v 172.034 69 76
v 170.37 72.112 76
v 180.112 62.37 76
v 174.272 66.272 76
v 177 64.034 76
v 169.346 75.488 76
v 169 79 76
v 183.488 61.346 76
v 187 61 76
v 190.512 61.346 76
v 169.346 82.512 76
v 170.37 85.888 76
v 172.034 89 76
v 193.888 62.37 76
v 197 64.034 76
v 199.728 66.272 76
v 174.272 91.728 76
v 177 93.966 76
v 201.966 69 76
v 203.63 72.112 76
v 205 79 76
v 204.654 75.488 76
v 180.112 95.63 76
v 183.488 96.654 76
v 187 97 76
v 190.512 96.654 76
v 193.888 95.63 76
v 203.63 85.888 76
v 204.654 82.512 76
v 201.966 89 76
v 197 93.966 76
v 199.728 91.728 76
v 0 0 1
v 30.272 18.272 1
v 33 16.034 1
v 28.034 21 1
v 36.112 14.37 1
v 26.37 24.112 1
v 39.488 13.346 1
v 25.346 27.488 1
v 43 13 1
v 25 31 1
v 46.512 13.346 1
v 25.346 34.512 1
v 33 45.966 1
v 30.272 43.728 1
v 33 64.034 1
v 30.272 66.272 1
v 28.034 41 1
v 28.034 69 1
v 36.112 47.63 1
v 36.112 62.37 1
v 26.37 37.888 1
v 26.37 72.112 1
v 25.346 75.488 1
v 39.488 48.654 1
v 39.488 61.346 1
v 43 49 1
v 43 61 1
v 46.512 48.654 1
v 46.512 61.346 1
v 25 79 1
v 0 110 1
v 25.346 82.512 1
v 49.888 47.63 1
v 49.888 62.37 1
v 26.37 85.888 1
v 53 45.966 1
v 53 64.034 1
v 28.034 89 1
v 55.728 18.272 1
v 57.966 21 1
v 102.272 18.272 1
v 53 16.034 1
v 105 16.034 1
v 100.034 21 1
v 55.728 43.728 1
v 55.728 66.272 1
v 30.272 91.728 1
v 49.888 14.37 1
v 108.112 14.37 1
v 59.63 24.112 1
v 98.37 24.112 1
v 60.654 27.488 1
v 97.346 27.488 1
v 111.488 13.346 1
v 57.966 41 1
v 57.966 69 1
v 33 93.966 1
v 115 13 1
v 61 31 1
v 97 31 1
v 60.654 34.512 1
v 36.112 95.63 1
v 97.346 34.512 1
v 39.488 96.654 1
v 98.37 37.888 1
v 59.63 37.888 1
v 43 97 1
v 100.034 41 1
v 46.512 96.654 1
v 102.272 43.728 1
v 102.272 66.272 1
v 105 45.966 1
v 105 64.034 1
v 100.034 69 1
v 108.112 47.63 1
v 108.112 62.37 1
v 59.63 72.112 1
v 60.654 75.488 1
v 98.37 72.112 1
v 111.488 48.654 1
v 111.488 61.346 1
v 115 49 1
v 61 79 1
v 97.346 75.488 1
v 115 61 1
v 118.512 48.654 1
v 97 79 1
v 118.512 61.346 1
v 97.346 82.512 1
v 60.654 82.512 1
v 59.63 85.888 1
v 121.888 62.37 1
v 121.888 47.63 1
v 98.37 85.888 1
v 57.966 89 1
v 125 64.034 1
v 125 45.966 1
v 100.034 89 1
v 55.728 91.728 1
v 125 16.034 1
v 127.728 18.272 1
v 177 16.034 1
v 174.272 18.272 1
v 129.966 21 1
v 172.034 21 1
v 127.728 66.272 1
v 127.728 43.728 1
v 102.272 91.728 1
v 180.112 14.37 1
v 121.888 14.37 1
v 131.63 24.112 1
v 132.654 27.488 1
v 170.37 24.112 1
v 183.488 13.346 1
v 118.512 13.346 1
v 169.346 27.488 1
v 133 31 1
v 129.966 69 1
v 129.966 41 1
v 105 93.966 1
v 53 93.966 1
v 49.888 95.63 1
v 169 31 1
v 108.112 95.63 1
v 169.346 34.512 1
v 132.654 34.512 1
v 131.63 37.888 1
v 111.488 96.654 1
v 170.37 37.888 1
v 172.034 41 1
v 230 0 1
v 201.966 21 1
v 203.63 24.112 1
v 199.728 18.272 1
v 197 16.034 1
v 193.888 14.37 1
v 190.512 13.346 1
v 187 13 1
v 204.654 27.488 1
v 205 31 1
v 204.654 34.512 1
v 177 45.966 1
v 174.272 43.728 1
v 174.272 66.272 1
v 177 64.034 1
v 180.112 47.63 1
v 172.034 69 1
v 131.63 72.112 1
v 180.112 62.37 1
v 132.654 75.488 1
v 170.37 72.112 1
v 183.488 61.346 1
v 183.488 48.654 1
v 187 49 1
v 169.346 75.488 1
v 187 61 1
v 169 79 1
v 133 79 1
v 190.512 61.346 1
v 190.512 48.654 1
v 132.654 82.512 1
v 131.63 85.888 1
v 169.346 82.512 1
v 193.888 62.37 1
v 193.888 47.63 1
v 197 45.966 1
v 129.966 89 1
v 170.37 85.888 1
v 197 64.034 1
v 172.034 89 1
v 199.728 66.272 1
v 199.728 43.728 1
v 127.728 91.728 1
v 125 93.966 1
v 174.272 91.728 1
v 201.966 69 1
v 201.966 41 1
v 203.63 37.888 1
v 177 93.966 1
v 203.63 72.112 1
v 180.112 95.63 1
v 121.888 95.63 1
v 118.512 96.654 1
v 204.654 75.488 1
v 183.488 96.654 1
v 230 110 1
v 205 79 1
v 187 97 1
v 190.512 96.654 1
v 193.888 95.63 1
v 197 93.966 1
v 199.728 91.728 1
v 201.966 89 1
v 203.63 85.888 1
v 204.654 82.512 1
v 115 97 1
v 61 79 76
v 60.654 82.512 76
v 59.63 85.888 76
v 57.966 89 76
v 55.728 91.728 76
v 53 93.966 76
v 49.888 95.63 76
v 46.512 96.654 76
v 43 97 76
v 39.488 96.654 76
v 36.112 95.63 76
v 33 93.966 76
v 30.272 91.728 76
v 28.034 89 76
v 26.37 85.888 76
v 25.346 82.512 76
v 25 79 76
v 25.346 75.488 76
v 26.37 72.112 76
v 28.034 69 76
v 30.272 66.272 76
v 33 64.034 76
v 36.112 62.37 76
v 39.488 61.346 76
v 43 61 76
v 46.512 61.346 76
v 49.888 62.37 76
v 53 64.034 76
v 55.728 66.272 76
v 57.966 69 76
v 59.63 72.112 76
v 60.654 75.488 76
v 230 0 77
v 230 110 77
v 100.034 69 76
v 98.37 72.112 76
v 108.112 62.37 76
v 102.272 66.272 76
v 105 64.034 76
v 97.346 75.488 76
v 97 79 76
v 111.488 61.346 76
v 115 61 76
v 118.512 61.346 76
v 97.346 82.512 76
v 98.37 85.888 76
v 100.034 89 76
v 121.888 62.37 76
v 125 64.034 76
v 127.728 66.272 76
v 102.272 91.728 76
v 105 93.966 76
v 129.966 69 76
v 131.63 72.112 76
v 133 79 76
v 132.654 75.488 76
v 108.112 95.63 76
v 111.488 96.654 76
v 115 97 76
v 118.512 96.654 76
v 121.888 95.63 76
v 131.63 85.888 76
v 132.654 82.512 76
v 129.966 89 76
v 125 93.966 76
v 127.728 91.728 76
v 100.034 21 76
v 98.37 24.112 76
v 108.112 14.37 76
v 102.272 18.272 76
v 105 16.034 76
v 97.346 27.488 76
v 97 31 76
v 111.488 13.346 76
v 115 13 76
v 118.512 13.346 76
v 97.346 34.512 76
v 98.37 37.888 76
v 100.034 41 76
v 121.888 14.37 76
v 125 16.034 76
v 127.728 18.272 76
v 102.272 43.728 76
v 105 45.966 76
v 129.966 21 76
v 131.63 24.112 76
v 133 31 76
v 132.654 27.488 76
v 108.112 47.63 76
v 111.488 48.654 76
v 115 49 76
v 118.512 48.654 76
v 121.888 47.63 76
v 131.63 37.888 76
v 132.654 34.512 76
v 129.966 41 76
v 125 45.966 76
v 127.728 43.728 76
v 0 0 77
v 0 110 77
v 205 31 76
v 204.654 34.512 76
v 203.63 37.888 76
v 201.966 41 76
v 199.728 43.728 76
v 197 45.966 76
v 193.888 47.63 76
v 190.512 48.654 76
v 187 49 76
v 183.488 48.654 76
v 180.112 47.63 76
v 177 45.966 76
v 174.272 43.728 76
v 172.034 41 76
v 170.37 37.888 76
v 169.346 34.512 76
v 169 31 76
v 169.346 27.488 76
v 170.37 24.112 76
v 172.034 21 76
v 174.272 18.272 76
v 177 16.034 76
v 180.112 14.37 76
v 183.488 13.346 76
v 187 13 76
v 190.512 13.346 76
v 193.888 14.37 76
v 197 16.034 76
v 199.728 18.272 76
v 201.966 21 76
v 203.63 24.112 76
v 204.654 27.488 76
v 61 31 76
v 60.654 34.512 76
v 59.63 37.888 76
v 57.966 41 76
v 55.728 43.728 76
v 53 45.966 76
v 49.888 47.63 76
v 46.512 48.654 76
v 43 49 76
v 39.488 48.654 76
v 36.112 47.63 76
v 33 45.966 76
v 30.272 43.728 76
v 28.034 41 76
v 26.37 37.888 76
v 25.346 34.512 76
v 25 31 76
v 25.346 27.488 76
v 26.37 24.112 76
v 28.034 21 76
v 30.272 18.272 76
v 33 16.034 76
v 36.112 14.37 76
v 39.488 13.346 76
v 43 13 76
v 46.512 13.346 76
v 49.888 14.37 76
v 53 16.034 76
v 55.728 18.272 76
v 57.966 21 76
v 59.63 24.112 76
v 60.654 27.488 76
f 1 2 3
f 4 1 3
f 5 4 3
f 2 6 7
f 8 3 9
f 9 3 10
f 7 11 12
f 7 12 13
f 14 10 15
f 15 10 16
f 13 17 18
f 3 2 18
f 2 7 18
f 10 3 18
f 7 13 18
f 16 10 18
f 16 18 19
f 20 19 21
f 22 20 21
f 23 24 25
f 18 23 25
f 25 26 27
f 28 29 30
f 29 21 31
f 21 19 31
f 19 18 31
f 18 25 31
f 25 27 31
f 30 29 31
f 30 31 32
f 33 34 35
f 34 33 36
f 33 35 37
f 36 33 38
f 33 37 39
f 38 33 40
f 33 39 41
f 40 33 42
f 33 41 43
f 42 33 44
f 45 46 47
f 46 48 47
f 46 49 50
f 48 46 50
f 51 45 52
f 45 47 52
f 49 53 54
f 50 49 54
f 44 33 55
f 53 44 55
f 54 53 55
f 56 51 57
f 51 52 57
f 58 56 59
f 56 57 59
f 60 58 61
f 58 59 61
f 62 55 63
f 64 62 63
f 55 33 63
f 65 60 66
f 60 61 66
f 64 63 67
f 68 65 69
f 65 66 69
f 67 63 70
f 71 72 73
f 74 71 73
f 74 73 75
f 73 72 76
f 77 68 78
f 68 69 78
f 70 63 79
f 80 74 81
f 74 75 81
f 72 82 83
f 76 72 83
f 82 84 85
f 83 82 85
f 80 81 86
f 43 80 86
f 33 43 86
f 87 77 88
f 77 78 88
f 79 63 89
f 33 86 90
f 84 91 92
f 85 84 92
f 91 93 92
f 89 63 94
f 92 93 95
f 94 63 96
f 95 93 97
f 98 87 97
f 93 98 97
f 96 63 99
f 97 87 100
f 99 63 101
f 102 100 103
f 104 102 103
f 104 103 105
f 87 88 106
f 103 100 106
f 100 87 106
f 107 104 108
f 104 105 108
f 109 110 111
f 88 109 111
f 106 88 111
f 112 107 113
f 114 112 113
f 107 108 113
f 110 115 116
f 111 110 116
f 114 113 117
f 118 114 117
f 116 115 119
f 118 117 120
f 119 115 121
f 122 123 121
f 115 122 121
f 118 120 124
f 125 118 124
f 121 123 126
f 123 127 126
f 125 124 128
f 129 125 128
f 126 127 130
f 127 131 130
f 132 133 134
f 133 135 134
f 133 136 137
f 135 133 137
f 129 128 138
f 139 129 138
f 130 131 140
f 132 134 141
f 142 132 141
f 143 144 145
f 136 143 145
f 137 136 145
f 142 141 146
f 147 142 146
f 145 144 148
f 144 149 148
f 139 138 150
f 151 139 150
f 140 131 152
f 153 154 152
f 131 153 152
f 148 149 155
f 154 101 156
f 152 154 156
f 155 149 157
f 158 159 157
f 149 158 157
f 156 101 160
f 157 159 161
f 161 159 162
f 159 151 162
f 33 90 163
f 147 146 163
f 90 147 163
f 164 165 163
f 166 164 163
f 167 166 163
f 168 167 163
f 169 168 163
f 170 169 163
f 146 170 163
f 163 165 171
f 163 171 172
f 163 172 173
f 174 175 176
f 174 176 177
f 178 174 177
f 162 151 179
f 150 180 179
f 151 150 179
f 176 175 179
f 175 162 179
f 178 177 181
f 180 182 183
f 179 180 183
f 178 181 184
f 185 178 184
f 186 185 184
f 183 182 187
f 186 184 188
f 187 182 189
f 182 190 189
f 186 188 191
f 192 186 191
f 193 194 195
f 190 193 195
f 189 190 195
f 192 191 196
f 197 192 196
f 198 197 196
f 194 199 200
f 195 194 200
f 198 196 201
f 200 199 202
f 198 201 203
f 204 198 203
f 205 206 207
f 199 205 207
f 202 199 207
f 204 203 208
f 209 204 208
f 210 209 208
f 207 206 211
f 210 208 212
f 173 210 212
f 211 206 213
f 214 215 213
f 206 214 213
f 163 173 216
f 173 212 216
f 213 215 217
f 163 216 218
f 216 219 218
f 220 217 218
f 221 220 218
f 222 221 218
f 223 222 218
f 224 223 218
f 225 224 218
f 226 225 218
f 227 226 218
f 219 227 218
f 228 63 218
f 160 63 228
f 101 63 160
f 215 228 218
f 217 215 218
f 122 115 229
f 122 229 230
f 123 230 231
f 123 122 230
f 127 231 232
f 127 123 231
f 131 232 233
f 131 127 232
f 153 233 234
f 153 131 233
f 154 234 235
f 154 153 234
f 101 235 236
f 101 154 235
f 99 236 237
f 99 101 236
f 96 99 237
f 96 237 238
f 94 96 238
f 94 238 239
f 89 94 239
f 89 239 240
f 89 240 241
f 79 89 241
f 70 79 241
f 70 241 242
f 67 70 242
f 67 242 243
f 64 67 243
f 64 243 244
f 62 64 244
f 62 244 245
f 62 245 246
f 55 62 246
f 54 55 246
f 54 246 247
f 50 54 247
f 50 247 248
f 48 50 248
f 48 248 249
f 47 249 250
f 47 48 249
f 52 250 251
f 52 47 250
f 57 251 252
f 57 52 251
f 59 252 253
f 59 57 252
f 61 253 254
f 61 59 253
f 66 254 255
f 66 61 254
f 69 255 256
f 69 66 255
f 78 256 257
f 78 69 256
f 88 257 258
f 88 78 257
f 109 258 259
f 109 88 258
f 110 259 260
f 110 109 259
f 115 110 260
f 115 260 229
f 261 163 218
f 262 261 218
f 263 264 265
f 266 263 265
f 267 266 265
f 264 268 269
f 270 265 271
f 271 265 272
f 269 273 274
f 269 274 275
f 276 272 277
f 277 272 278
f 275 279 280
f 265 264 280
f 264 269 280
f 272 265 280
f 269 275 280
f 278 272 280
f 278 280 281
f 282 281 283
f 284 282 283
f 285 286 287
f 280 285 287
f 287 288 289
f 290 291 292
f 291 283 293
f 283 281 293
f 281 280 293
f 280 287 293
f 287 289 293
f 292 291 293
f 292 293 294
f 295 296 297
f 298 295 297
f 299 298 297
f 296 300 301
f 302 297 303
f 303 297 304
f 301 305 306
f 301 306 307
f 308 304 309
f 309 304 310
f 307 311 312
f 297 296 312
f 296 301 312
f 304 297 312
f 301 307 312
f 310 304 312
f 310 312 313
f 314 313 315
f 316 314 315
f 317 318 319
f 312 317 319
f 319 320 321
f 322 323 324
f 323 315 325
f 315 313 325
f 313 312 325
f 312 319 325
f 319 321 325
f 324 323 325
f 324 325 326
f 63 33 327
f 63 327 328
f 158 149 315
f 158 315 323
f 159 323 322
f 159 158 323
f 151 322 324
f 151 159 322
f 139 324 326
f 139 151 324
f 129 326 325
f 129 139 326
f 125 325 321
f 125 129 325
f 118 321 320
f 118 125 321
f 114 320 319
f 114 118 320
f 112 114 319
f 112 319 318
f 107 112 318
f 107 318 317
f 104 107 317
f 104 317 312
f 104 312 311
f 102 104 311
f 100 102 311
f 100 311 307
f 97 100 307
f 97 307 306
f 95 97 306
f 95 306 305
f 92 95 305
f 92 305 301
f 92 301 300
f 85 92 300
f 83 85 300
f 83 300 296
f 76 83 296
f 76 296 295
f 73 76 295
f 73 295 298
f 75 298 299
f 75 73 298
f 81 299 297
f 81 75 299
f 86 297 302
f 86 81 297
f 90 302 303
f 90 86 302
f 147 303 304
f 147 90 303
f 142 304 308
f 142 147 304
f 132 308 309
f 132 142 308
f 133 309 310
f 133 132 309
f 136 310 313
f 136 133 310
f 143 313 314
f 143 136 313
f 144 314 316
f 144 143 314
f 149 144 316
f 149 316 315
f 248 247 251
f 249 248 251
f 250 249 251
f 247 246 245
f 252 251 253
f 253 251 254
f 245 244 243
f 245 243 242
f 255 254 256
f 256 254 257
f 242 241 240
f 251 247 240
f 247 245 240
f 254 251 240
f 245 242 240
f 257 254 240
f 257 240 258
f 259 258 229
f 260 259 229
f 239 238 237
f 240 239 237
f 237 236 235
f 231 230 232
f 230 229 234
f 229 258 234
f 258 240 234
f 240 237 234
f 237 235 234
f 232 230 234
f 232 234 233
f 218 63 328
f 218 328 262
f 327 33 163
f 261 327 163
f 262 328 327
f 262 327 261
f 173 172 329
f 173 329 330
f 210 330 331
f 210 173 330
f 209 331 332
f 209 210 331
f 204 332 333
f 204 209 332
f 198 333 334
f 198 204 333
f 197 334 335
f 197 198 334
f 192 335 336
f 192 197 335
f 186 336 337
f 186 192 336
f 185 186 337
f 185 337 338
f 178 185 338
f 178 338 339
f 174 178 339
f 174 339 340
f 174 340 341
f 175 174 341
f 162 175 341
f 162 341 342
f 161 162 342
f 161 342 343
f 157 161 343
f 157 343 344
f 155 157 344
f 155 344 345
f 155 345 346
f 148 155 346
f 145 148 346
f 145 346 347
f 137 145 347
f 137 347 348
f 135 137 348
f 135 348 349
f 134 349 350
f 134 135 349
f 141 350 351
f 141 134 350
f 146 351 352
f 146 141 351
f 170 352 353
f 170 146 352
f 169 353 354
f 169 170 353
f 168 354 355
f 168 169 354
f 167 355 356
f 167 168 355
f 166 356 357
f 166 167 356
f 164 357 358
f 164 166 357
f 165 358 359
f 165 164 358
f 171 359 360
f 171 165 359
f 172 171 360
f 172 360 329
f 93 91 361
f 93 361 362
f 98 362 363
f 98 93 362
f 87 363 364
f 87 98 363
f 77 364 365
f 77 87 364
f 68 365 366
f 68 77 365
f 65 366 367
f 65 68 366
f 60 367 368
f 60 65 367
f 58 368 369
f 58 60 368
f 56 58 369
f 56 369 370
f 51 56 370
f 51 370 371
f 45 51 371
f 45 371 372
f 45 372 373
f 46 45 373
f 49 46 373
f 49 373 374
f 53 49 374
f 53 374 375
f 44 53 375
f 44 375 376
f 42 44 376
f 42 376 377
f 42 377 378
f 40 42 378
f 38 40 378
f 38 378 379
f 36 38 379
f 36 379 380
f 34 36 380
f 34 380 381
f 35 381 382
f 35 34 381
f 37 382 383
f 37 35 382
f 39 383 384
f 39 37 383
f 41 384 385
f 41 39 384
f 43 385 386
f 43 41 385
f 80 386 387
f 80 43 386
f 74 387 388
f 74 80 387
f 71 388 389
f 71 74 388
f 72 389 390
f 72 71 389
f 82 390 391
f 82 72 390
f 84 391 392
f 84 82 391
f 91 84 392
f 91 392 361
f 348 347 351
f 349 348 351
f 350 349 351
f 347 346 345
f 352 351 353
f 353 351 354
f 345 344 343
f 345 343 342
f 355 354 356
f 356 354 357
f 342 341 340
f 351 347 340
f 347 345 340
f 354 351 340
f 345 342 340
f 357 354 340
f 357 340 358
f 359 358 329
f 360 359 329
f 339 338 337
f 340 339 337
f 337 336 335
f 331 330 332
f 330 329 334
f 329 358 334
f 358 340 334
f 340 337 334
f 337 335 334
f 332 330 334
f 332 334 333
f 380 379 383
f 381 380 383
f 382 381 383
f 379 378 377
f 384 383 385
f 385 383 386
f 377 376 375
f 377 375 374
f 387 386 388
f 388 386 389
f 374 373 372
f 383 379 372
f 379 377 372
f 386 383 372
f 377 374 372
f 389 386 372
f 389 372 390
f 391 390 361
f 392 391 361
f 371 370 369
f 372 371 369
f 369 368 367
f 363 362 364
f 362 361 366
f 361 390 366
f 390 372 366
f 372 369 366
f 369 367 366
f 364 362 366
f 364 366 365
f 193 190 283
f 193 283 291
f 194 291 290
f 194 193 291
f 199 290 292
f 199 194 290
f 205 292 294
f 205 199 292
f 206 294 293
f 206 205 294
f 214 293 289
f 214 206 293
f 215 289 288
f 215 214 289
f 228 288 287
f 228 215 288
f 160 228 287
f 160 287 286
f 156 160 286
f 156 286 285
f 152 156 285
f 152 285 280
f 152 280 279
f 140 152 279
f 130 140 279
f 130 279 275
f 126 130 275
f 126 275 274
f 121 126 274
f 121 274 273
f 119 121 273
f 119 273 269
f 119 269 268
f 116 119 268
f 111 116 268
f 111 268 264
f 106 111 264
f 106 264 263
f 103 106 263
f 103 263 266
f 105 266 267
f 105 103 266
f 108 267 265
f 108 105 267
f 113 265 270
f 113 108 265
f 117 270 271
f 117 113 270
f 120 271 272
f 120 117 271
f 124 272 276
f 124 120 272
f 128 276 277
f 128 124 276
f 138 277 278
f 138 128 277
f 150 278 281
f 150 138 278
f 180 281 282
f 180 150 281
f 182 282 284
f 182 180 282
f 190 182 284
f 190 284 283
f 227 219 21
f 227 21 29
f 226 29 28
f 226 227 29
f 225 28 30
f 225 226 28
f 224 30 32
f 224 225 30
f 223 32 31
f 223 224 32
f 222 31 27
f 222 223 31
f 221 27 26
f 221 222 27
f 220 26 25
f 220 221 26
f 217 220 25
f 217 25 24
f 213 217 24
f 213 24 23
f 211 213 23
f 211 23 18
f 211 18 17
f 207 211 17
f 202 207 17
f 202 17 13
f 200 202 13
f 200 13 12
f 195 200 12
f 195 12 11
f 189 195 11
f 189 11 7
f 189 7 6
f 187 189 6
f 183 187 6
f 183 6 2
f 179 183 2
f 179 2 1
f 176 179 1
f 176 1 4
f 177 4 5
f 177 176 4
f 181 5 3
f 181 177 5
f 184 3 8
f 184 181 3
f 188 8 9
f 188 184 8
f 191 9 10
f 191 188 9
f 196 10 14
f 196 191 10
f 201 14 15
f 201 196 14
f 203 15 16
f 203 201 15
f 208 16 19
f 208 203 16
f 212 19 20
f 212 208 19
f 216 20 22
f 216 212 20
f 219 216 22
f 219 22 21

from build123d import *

# Parameters (mm, degrees)
CYLINDER001_R     = 18
CYLINDER001_DEPTH = 76
CYLINDER002_R     = 18
CYLINDER002_DEPTH = 76
CYLINDER003_R     = 18
CYLINDER003_DEPTH = 76
CYLINDER004_R     = 18
CYLINDER004_DEPTH = 76
CYLINDER005_R     = 18
CYLINDER005_DEPTH = 76
CYLINDER_R        = 18
CYLINDER_DEPTH    = 76
BOX_W             = 230
BOX_H             = 110
BOX_DEPTH         = 76


with BuildPart() as cylinder001:
    # Cylinder001 → Cylinder001 (new body)
    with BuildSketch(Plane(origin=(115, 31, 0), x_dir=(1, 0, 0), z_dir=(0, 0, 1))):
        Circle(CYLINDER001_R)
    extrude(amount=CYLINDER001_DEPTH)


with BuildPart() as cylinder002:
    # Cylinder002 → Cylinder002 (new body)
    with BuildSketch(Plane(origin=(187, 31, 0), x_dir=(1, 0, 0), z_dir=(0, 0, 1))):
        Circle(CYLINDER002_R)
    extrude(amount=CYLINDER002_DEPTH)


with BuildPart() as cylinder003:
    # Cylinder003 → Cylinder003 (new body)
    with BuildSketch(Plane(origin=(187, 79, 0), x_dir=(1, 0, 0), z_dir=(0, 0, 1))):
        Circle(CYLINDER003_R)
    extrude(amount=CYLINDER003_DEPTH)


with BuildPart() as cylinder004:
    # Cylinder004 → Cylinder004 (new body)
    with BuildSketch(Plane(origin=(115, 79, 0), x_dir=(1, 0, 0), z_dir=(0, 0, 1))):
        Circle(CYLINDER004_R)
    extrude(amount=CYLINDER004_DEPTH)


with BuildPart() as cylinder005:
    # Cylinder005 → Cylinder005 (new body)
    with BuildSketch(Plane(origin=(43, 79, 0), x_dir=(1, 0, 0), z_dir=(0, 0, 1))):
        Circle(CYLINDER005_R)
    extrude(amount=CYLINDER005_DEPTH)


with BuildPart() as forats:
    # Cylinder → Cylinder (new body)
    with BuildSketch(Plane(origin=(43, 31, 0), x_dir=(1, 0, 0), z_dir=(0, 0, 1))):
        Circle(CYLINDER_R)
    extrude(amount=CYLINDER_DEPTH)

    # Fusion: union Cylinder001, Cylinder002, Cylinder003, Cylinder004, Cylinder005
    add(cylinder001.part)
    add(cylinder002.part)
    add(cylinder003.part)
    add(cylinder004.part)
    add(cylinder005.part)


with BuildPart() as totxo:
    # Box → Box (new body)
    with BuildSketch(Plane.XY.offset(1)):
        with Locations((115, 55)):
            Rectangle(BOX_W, BOX_H)
    extrude(amount=BOX_DEPTH)

    # Cut: cut Forats
    add(forats.part, mode=Mode.SUBTRACT)


solid = totxo.part
